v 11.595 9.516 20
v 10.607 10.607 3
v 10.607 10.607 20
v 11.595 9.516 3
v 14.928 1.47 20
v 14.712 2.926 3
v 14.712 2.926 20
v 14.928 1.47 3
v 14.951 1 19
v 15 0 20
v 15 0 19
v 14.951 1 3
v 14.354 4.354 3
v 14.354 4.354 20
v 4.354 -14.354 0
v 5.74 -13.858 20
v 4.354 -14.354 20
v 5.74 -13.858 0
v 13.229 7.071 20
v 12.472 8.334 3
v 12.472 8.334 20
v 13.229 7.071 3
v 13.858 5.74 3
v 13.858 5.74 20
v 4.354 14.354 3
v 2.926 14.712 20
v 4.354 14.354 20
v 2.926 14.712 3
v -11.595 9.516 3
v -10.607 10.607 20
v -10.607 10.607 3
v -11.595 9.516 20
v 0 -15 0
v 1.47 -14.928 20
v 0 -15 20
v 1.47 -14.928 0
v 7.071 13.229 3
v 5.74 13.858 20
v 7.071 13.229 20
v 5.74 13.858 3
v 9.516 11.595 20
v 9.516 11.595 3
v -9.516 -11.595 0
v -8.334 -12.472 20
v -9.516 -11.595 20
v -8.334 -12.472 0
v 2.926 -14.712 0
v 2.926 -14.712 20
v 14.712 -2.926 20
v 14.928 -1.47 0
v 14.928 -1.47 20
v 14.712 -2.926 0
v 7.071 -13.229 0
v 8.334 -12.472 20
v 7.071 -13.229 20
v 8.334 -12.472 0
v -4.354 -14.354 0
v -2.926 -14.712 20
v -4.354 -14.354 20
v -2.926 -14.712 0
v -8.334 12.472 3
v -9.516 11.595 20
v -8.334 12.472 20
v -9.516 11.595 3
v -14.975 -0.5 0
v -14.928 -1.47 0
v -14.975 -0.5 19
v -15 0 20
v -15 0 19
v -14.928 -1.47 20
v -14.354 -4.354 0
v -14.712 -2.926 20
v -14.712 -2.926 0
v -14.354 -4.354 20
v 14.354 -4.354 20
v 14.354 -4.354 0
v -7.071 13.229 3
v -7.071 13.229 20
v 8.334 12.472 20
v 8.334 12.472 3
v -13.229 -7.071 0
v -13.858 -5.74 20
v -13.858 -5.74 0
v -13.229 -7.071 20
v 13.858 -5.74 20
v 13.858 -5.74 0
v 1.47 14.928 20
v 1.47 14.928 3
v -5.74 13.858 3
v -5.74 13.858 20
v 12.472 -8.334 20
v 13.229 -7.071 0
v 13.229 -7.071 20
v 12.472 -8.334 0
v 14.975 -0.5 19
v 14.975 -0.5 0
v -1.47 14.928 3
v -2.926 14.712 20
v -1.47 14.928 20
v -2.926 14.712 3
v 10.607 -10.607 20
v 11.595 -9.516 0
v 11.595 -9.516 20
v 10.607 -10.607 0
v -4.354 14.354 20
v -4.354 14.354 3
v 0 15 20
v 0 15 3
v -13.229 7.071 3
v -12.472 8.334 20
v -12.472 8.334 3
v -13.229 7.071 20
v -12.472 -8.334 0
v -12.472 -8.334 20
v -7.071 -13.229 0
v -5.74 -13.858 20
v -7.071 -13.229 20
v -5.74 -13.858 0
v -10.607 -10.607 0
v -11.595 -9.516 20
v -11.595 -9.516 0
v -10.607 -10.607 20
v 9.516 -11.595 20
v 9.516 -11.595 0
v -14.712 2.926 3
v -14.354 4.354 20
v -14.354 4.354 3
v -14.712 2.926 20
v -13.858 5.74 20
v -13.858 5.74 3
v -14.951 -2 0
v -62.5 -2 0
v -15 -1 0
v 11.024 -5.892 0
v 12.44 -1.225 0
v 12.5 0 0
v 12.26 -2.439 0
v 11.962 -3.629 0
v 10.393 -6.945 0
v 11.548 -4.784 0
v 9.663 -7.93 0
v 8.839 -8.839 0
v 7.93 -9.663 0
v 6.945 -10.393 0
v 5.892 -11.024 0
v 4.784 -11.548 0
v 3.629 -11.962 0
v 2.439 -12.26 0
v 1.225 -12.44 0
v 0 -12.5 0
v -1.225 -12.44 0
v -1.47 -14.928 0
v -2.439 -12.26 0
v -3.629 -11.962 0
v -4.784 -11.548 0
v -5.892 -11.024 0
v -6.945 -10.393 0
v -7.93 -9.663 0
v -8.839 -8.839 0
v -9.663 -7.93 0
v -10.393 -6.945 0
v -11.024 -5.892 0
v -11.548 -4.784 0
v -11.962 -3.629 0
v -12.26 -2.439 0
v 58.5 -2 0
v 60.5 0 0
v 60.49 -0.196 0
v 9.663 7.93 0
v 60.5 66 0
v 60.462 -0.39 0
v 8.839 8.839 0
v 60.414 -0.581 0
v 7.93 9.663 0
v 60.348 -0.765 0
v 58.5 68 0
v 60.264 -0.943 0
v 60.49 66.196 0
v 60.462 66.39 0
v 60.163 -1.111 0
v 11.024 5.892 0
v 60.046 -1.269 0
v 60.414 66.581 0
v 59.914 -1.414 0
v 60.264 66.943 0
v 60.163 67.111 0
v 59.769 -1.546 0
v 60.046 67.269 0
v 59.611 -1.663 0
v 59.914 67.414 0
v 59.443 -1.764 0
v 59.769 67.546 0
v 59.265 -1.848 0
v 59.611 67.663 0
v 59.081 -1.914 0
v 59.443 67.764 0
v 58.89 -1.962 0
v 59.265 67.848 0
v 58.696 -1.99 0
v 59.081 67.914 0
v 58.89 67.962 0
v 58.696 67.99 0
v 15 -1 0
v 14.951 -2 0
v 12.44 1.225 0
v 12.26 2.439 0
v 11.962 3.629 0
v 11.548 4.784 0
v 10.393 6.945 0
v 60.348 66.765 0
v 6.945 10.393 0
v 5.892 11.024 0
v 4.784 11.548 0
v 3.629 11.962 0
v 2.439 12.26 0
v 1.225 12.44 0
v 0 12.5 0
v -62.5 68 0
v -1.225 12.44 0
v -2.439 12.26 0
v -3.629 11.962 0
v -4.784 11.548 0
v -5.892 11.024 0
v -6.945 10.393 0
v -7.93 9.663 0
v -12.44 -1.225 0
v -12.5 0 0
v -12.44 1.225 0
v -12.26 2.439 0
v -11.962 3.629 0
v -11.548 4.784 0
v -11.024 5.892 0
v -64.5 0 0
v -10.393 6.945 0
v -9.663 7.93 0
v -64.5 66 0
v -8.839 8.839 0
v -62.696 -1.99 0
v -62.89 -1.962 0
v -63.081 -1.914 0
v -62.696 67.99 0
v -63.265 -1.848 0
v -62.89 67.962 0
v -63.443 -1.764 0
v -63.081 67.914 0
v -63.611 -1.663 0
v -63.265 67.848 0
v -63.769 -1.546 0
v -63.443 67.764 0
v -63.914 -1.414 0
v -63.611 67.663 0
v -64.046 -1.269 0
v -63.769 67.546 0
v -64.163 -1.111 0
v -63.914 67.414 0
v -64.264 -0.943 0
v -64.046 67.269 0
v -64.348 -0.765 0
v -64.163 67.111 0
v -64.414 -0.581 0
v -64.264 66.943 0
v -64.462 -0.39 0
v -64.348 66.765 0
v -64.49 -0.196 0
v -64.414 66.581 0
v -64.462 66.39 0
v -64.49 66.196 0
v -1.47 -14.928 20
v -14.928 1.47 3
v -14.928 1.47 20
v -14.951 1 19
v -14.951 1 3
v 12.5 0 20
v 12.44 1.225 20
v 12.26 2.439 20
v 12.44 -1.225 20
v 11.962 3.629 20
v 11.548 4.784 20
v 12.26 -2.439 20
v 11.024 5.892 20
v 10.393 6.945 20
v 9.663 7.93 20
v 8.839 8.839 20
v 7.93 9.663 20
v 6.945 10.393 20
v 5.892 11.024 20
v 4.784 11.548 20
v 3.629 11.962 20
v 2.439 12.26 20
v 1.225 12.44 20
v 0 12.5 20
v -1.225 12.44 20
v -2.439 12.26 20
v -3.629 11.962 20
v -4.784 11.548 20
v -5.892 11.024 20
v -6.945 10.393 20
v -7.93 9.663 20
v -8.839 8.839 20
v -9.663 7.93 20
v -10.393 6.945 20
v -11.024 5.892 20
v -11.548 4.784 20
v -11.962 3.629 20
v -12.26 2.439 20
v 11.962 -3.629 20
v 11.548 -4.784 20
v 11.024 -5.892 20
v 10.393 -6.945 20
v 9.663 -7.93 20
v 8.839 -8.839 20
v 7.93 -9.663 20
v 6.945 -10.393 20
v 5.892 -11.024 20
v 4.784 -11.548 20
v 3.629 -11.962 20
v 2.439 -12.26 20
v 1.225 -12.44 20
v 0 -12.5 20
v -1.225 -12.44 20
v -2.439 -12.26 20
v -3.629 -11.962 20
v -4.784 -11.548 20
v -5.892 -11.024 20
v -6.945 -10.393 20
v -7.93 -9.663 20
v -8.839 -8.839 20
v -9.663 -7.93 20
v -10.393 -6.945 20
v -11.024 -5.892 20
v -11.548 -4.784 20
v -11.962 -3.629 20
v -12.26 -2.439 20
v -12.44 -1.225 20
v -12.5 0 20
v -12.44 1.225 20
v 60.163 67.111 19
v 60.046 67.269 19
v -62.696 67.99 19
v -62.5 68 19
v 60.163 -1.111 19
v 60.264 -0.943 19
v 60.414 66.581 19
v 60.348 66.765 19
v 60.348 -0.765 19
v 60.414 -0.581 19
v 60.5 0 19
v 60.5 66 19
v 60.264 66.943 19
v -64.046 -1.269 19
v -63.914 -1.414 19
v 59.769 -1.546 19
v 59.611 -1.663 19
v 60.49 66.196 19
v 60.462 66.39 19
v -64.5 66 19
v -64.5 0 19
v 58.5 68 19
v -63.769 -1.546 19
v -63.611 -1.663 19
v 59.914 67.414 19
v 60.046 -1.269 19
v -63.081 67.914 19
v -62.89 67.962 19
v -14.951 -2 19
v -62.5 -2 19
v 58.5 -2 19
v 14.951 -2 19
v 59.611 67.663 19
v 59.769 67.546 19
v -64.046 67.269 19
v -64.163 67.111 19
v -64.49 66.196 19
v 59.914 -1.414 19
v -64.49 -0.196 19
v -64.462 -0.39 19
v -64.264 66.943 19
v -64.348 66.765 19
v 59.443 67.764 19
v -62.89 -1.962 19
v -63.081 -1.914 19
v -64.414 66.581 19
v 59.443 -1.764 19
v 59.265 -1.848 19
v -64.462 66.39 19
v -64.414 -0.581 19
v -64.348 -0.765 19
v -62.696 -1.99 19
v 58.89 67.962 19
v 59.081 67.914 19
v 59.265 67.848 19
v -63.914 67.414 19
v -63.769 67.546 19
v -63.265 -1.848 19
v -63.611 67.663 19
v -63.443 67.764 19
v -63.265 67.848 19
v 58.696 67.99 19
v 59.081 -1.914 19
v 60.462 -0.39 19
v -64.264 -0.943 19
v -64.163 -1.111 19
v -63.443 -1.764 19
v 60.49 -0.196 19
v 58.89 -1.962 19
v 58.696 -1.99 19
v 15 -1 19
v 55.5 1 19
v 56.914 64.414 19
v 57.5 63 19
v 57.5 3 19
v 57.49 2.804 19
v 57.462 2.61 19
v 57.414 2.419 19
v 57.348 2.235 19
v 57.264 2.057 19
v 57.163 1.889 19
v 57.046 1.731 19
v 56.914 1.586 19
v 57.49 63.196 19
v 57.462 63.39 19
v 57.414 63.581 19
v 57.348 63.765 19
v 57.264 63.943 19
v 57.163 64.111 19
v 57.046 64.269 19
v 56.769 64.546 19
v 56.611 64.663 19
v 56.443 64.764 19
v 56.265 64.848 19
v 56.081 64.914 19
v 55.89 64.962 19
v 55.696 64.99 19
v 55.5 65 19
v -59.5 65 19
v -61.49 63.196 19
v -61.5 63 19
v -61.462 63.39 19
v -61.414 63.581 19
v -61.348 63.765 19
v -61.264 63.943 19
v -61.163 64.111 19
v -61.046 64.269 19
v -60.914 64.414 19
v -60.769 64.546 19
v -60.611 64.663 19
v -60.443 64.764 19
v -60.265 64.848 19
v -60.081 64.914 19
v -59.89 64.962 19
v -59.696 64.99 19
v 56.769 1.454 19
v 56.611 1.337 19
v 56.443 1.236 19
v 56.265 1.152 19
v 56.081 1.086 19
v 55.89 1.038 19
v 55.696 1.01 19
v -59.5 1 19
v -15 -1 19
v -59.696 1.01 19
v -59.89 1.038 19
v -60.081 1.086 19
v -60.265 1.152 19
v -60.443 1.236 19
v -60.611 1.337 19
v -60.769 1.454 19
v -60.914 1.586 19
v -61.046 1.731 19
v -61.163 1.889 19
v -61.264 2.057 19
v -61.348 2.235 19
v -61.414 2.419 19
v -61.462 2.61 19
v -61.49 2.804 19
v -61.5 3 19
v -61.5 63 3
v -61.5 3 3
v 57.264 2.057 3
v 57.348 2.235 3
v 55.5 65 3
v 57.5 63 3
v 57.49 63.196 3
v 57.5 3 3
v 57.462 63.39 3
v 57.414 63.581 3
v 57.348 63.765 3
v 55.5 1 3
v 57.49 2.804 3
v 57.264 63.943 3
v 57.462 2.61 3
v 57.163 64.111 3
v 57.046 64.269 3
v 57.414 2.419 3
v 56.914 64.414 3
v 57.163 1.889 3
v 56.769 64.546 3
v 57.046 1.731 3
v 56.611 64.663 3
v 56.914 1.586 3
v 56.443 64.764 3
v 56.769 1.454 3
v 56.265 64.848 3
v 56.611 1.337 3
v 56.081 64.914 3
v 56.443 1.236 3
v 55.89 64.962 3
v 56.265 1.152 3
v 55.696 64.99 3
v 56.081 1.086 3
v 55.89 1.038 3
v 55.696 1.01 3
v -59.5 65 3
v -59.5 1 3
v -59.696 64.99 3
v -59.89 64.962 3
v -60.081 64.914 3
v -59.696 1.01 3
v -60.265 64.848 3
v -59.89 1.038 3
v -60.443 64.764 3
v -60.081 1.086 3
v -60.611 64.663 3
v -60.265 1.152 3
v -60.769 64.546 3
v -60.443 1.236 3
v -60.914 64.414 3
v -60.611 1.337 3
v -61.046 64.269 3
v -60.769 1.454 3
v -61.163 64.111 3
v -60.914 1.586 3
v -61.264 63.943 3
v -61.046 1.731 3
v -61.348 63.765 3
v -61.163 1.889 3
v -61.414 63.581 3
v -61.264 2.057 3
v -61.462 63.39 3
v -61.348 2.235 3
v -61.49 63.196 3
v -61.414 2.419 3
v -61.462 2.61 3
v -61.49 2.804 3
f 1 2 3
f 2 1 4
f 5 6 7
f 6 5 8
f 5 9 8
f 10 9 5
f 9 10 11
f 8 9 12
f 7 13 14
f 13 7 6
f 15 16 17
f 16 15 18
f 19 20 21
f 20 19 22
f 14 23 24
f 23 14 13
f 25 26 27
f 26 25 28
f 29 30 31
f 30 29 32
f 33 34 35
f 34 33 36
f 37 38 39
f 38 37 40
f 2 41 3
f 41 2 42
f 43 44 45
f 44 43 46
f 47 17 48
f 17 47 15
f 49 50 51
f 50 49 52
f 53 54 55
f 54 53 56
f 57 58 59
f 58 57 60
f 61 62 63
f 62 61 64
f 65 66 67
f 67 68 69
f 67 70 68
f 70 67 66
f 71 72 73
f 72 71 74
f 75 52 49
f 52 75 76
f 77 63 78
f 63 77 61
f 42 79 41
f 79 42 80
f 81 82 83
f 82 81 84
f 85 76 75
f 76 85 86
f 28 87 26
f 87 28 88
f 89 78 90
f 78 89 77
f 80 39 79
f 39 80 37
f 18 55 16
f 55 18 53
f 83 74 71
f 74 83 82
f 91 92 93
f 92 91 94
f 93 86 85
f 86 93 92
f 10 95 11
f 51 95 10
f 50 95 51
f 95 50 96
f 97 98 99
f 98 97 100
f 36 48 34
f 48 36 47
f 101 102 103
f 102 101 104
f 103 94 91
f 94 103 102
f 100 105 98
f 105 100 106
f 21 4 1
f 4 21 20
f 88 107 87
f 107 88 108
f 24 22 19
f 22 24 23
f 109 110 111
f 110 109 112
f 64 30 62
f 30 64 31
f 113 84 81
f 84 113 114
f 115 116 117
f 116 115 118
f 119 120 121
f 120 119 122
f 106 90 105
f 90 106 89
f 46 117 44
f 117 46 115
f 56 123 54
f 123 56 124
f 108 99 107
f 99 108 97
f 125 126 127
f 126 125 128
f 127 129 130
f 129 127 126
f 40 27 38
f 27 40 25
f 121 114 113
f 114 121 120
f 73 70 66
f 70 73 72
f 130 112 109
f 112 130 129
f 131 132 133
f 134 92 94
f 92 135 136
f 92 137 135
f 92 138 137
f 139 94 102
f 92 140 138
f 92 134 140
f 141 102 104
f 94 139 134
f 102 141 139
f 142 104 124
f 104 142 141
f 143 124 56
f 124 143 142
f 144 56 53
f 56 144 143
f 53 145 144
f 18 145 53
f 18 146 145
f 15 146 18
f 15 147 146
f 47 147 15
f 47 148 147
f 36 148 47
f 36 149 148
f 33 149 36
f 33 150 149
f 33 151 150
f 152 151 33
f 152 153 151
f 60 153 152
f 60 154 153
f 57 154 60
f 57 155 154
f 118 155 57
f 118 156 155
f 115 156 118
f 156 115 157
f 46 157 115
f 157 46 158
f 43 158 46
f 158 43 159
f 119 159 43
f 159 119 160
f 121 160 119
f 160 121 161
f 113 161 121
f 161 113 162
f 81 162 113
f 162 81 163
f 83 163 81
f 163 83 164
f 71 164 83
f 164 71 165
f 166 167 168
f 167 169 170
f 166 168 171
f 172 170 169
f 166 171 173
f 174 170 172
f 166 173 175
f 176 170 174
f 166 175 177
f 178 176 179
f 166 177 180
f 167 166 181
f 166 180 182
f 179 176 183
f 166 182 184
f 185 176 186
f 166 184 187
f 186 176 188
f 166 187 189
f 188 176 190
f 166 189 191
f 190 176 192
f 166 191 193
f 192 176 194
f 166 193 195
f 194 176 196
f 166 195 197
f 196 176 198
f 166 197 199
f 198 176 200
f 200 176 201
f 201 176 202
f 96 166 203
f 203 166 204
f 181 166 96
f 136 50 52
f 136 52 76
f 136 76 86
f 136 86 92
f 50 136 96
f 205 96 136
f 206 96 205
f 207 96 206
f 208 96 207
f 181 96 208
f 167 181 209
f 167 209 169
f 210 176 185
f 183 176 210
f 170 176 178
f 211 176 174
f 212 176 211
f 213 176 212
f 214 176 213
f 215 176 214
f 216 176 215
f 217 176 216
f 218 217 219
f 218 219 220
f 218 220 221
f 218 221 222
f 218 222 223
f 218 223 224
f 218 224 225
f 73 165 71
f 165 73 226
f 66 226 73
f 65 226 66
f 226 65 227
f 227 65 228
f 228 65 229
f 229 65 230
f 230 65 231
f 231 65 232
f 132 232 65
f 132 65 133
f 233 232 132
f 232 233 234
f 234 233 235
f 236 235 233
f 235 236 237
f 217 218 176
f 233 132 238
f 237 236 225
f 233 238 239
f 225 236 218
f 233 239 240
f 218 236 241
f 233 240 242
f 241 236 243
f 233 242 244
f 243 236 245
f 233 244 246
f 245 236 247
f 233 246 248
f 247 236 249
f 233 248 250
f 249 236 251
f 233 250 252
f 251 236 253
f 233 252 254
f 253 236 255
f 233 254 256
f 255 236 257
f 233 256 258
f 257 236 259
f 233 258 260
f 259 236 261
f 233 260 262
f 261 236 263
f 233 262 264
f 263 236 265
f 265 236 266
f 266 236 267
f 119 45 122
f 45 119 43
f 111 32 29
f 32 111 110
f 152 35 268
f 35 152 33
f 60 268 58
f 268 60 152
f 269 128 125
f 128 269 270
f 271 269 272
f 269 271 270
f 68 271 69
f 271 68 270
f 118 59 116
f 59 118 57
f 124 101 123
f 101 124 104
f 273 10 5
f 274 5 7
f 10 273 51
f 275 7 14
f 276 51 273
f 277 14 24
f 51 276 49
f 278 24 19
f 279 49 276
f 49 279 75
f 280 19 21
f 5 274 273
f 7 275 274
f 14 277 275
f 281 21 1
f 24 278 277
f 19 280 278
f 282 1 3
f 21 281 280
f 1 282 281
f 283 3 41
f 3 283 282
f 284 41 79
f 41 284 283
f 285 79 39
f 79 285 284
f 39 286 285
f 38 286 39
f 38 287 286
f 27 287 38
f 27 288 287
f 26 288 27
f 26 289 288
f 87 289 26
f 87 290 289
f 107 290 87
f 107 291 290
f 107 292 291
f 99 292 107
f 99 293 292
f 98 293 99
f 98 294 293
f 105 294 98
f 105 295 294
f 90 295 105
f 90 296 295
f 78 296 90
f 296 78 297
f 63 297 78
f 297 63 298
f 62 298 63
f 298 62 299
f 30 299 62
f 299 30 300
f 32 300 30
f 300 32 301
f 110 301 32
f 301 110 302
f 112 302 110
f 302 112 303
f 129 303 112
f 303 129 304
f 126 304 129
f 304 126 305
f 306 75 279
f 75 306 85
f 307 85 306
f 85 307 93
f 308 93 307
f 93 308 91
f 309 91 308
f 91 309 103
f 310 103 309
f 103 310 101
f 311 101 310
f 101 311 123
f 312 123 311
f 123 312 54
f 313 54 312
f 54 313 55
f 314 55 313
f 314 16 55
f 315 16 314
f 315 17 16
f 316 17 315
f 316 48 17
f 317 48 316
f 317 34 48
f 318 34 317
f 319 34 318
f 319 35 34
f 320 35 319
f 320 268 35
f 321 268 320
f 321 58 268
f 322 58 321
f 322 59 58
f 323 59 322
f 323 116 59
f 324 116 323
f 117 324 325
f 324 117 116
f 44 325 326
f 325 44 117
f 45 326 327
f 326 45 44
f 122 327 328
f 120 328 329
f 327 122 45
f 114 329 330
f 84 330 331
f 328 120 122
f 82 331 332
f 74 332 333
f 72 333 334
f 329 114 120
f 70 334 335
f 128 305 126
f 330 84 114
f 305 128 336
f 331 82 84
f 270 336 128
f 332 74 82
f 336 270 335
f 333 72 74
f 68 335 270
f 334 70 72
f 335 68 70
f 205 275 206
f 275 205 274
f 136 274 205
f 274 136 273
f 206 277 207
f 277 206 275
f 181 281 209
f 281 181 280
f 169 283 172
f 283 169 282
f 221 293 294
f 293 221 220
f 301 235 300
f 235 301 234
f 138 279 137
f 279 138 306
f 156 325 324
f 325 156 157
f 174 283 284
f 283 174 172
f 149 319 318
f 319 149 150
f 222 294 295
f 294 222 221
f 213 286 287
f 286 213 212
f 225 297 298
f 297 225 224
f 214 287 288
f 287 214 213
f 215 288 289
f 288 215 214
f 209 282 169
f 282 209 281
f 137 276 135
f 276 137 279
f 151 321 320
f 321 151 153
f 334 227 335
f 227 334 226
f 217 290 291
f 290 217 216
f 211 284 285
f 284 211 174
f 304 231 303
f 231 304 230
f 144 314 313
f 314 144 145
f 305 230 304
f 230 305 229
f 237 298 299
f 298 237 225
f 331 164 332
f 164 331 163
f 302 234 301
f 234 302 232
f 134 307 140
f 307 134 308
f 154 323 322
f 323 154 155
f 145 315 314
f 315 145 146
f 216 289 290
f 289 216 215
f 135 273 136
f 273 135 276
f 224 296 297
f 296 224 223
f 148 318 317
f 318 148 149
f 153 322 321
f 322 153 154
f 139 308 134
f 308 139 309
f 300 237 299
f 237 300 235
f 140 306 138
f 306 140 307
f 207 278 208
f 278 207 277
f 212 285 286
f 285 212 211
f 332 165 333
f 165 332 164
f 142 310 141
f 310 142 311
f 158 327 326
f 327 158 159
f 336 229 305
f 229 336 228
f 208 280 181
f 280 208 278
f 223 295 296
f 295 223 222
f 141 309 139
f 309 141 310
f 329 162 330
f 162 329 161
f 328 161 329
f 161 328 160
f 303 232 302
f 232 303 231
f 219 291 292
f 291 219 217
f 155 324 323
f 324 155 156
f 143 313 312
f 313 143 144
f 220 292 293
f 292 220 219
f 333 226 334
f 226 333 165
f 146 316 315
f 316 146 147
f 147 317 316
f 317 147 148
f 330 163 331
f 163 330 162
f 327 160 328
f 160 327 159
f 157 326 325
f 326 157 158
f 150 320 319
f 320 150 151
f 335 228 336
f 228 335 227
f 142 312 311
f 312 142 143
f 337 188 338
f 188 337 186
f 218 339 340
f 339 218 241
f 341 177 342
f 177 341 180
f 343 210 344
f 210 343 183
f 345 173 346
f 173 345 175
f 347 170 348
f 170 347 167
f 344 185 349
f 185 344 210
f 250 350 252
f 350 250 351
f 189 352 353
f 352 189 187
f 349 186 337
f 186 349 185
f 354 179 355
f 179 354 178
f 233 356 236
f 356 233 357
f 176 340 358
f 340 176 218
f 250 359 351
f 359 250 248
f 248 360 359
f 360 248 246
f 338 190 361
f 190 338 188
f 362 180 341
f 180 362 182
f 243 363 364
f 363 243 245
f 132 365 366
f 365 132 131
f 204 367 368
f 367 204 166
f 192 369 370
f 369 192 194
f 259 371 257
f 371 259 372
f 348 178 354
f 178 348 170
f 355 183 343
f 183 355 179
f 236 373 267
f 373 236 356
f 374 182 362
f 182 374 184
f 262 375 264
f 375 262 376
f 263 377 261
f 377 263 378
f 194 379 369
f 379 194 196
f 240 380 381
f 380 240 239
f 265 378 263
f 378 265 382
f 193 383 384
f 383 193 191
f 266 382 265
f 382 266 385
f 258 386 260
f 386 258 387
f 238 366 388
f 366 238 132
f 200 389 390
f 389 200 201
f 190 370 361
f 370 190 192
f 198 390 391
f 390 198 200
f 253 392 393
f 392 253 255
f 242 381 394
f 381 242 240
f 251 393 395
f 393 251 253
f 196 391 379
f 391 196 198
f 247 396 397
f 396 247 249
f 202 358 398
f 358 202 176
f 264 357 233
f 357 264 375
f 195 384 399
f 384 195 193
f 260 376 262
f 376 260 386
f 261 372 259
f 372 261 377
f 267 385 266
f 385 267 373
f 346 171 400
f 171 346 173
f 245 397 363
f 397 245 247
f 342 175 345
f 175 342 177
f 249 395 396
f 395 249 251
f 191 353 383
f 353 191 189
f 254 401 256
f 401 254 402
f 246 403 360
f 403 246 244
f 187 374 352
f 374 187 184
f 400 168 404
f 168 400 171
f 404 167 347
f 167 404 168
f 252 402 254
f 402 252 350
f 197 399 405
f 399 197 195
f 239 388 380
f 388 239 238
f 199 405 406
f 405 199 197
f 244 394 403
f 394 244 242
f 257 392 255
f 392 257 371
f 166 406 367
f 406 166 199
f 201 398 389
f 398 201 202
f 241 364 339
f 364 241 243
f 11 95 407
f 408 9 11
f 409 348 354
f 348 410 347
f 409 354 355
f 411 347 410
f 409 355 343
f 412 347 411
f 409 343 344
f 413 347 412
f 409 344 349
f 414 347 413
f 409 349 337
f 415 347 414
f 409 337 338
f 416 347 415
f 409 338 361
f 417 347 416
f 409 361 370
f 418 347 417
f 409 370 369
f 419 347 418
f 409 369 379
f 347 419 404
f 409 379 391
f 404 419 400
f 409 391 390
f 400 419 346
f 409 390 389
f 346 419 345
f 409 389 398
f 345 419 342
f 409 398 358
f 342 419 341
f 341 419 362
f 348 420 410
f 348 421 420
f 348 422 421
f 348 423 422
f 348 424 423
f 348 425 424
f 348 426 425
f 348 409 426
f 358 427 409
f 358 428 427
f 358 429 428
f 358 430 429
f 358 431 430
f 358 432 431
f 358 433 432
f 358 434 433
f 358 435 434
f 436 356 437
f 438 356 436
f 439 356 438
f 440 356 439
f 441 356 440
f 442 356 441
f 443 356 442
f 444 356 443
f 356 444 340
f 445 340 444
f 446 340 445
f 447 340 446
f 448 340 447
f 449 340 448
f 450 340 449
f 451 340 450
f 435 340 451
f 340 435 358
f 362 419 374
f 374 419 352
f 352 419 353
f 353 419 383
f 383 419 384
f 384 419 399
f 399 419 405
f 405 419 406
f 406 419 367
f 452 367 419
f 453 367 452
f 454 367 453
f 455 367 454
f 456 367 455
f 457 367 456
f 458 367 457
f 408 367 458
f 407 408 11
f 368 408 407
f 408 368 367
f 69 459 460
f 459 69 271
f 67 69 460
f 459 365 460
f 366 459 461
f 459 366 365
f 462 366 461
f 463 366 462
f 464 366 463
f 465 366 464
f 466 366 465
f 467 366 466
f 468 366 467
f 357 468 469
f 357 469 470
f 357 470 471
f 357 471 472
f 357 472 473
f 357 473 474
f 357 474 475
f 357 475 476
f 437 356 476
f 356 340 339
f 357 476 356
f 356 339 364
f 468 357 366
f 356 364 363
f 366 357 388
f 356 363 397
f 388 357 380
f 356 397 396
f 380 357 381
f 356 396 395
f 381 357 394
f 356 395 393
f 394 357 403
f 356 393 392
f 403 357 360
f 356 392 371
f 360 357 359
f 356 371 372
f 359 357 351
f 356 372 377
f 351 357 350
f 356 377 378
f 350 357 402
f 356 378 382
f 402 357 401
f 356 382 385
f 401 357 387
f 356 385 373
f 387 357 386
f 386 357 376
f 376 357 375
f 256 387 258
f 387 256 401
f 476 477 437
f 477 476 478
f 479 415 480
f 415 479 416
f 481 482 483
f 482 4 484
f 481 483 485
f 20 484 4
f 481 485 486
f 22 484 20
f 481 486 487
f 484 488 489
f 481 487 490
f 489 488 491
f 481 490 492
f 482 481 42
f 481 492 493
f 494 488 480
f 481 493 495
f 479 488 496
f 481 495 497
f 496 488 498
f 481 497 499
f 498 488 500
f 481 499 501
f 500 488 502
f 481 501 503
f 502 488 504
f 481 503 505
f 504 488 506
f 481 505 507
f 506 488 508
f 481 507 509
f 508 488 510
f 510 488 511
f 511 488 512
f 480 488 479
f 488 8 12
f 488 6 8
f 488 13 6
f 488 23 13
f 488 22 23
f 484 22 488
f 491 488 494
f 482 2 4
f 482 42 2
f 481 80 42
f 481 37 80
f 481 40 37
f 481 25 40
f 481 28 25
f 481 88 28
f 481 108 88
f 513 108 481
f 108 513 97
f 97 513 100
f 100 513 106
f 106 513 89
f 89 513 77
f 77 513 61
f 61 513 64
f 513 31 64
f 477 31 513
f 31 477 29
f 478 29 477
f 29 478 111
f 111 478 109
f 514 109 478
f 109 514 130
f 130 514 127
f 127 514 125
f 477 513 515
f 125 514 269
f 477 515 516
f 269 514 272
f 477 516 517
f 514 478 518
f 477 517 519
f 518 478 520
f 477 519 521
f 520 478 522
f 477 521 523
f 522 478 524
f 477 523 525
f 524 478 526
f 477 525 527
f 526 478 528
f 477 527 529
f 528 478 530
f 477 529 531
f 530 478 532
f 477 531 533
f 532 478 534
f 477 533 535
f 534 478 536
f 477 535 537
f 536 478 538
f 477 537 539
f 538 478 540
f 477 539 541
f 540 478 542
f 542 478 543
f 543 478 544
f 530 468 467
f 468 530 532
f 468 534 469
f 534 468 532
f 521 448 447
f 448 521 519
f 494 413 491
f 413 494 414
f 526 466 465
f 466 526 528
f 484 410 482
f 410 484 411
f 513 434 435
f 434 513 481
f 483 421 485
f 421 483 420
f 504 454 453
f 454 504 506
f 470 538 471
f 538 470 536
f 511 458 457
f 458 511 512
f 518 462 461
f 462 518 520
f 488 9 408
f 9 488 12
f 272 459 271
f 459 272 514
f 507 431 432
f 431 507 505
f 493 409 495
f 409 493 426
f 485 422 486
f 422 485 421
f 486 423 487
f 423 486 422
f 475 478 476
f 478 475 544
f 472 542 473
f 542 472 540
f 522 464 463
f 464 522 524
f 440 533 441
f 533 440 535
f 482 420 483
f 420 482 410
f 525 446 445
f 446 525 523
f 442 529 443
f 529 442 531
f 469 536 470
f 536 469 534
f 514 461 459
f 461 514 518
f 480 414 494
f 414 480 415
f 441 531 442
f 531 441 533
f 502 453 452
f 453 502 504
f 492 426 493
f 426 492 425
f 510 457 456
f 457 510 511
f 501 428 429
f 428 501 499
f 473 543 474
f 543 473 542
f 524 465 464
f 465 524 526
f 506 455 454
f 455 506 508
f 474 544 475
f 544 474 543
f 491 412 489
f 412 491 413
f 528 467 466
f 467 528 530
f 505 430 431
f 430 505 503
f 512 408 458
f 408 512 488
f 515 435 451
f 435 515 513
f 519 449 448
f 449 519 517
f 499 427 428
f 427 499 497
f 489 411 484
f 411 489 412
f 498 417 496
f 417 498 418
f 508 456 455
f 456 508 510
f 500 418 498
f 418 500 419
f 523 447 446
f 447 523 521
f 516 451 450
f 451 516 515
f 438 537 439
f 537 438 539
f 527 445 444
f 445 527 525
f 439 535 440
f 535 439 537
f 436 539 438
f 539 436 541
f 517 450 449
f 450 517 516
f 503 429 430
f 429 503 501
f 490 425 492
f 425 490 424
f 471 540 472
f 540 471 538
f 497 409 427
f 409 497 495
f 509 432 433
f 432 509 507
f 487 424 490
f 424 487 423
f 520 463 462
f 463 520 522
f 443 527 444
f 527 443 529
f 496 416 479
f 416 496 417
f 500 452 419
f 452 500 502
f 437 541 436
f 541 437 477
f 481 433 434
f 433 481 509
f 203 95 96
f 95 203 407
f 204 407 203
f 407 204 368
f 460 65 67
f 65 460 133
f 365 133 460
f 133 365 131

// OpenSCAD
// ============================================================
// Tray
// Clips onto wooden rod, small storage tray
// ============================================================
$fn = 64;

// --- Rod ---
rod_diameter = 24;
rod_clearance = 0.5;

// --- Collar ---
collar_height = 20;
collar_wall = 3;

// --- Tray ---
tray_length = 125;
tray_width = 70;
tray_rim = 18;
wall = 3;
corner_radius = 2;

collar_r = rod_diameter/2 + collar_wall;

union() {
    // Collar - at origin
    difference() {
        cylinder(h = collar_height, r = collar_r);
        translate([0, 0, -1])
            cylinder(h = collar_height + 2, r = rod_diameter/2 + rod_clearance);
    }

    // Tray - bord court aligné avec le collier, s'étend vers l'avant (Y positif)
    translate([-tray_length/2, 0, 0])
        difference() {
            minkowski() {
                cube([tray_length - corner_radius*2,
                      tray_width - corner_radius*2,
                      tray_rim]);
                cylinder(r = corner_radius, h = 1);
            }
            // Hollow inside
            translate([wall, wall, wall])
                minkowski() {
                    cube([tray_length - wall*2 - corner_radius*2,
                          tray_width - wall*2 - corner_radius*2,
                          tray_rim]);
                    cylinder(r = corner_radius, h = 1);
                }
            // Cut out collar shape from tray rim
            translate([tray_length/2, -1, -1])
                cylinder(h = tray_rim + 2, r = collar_r);
        }
}
